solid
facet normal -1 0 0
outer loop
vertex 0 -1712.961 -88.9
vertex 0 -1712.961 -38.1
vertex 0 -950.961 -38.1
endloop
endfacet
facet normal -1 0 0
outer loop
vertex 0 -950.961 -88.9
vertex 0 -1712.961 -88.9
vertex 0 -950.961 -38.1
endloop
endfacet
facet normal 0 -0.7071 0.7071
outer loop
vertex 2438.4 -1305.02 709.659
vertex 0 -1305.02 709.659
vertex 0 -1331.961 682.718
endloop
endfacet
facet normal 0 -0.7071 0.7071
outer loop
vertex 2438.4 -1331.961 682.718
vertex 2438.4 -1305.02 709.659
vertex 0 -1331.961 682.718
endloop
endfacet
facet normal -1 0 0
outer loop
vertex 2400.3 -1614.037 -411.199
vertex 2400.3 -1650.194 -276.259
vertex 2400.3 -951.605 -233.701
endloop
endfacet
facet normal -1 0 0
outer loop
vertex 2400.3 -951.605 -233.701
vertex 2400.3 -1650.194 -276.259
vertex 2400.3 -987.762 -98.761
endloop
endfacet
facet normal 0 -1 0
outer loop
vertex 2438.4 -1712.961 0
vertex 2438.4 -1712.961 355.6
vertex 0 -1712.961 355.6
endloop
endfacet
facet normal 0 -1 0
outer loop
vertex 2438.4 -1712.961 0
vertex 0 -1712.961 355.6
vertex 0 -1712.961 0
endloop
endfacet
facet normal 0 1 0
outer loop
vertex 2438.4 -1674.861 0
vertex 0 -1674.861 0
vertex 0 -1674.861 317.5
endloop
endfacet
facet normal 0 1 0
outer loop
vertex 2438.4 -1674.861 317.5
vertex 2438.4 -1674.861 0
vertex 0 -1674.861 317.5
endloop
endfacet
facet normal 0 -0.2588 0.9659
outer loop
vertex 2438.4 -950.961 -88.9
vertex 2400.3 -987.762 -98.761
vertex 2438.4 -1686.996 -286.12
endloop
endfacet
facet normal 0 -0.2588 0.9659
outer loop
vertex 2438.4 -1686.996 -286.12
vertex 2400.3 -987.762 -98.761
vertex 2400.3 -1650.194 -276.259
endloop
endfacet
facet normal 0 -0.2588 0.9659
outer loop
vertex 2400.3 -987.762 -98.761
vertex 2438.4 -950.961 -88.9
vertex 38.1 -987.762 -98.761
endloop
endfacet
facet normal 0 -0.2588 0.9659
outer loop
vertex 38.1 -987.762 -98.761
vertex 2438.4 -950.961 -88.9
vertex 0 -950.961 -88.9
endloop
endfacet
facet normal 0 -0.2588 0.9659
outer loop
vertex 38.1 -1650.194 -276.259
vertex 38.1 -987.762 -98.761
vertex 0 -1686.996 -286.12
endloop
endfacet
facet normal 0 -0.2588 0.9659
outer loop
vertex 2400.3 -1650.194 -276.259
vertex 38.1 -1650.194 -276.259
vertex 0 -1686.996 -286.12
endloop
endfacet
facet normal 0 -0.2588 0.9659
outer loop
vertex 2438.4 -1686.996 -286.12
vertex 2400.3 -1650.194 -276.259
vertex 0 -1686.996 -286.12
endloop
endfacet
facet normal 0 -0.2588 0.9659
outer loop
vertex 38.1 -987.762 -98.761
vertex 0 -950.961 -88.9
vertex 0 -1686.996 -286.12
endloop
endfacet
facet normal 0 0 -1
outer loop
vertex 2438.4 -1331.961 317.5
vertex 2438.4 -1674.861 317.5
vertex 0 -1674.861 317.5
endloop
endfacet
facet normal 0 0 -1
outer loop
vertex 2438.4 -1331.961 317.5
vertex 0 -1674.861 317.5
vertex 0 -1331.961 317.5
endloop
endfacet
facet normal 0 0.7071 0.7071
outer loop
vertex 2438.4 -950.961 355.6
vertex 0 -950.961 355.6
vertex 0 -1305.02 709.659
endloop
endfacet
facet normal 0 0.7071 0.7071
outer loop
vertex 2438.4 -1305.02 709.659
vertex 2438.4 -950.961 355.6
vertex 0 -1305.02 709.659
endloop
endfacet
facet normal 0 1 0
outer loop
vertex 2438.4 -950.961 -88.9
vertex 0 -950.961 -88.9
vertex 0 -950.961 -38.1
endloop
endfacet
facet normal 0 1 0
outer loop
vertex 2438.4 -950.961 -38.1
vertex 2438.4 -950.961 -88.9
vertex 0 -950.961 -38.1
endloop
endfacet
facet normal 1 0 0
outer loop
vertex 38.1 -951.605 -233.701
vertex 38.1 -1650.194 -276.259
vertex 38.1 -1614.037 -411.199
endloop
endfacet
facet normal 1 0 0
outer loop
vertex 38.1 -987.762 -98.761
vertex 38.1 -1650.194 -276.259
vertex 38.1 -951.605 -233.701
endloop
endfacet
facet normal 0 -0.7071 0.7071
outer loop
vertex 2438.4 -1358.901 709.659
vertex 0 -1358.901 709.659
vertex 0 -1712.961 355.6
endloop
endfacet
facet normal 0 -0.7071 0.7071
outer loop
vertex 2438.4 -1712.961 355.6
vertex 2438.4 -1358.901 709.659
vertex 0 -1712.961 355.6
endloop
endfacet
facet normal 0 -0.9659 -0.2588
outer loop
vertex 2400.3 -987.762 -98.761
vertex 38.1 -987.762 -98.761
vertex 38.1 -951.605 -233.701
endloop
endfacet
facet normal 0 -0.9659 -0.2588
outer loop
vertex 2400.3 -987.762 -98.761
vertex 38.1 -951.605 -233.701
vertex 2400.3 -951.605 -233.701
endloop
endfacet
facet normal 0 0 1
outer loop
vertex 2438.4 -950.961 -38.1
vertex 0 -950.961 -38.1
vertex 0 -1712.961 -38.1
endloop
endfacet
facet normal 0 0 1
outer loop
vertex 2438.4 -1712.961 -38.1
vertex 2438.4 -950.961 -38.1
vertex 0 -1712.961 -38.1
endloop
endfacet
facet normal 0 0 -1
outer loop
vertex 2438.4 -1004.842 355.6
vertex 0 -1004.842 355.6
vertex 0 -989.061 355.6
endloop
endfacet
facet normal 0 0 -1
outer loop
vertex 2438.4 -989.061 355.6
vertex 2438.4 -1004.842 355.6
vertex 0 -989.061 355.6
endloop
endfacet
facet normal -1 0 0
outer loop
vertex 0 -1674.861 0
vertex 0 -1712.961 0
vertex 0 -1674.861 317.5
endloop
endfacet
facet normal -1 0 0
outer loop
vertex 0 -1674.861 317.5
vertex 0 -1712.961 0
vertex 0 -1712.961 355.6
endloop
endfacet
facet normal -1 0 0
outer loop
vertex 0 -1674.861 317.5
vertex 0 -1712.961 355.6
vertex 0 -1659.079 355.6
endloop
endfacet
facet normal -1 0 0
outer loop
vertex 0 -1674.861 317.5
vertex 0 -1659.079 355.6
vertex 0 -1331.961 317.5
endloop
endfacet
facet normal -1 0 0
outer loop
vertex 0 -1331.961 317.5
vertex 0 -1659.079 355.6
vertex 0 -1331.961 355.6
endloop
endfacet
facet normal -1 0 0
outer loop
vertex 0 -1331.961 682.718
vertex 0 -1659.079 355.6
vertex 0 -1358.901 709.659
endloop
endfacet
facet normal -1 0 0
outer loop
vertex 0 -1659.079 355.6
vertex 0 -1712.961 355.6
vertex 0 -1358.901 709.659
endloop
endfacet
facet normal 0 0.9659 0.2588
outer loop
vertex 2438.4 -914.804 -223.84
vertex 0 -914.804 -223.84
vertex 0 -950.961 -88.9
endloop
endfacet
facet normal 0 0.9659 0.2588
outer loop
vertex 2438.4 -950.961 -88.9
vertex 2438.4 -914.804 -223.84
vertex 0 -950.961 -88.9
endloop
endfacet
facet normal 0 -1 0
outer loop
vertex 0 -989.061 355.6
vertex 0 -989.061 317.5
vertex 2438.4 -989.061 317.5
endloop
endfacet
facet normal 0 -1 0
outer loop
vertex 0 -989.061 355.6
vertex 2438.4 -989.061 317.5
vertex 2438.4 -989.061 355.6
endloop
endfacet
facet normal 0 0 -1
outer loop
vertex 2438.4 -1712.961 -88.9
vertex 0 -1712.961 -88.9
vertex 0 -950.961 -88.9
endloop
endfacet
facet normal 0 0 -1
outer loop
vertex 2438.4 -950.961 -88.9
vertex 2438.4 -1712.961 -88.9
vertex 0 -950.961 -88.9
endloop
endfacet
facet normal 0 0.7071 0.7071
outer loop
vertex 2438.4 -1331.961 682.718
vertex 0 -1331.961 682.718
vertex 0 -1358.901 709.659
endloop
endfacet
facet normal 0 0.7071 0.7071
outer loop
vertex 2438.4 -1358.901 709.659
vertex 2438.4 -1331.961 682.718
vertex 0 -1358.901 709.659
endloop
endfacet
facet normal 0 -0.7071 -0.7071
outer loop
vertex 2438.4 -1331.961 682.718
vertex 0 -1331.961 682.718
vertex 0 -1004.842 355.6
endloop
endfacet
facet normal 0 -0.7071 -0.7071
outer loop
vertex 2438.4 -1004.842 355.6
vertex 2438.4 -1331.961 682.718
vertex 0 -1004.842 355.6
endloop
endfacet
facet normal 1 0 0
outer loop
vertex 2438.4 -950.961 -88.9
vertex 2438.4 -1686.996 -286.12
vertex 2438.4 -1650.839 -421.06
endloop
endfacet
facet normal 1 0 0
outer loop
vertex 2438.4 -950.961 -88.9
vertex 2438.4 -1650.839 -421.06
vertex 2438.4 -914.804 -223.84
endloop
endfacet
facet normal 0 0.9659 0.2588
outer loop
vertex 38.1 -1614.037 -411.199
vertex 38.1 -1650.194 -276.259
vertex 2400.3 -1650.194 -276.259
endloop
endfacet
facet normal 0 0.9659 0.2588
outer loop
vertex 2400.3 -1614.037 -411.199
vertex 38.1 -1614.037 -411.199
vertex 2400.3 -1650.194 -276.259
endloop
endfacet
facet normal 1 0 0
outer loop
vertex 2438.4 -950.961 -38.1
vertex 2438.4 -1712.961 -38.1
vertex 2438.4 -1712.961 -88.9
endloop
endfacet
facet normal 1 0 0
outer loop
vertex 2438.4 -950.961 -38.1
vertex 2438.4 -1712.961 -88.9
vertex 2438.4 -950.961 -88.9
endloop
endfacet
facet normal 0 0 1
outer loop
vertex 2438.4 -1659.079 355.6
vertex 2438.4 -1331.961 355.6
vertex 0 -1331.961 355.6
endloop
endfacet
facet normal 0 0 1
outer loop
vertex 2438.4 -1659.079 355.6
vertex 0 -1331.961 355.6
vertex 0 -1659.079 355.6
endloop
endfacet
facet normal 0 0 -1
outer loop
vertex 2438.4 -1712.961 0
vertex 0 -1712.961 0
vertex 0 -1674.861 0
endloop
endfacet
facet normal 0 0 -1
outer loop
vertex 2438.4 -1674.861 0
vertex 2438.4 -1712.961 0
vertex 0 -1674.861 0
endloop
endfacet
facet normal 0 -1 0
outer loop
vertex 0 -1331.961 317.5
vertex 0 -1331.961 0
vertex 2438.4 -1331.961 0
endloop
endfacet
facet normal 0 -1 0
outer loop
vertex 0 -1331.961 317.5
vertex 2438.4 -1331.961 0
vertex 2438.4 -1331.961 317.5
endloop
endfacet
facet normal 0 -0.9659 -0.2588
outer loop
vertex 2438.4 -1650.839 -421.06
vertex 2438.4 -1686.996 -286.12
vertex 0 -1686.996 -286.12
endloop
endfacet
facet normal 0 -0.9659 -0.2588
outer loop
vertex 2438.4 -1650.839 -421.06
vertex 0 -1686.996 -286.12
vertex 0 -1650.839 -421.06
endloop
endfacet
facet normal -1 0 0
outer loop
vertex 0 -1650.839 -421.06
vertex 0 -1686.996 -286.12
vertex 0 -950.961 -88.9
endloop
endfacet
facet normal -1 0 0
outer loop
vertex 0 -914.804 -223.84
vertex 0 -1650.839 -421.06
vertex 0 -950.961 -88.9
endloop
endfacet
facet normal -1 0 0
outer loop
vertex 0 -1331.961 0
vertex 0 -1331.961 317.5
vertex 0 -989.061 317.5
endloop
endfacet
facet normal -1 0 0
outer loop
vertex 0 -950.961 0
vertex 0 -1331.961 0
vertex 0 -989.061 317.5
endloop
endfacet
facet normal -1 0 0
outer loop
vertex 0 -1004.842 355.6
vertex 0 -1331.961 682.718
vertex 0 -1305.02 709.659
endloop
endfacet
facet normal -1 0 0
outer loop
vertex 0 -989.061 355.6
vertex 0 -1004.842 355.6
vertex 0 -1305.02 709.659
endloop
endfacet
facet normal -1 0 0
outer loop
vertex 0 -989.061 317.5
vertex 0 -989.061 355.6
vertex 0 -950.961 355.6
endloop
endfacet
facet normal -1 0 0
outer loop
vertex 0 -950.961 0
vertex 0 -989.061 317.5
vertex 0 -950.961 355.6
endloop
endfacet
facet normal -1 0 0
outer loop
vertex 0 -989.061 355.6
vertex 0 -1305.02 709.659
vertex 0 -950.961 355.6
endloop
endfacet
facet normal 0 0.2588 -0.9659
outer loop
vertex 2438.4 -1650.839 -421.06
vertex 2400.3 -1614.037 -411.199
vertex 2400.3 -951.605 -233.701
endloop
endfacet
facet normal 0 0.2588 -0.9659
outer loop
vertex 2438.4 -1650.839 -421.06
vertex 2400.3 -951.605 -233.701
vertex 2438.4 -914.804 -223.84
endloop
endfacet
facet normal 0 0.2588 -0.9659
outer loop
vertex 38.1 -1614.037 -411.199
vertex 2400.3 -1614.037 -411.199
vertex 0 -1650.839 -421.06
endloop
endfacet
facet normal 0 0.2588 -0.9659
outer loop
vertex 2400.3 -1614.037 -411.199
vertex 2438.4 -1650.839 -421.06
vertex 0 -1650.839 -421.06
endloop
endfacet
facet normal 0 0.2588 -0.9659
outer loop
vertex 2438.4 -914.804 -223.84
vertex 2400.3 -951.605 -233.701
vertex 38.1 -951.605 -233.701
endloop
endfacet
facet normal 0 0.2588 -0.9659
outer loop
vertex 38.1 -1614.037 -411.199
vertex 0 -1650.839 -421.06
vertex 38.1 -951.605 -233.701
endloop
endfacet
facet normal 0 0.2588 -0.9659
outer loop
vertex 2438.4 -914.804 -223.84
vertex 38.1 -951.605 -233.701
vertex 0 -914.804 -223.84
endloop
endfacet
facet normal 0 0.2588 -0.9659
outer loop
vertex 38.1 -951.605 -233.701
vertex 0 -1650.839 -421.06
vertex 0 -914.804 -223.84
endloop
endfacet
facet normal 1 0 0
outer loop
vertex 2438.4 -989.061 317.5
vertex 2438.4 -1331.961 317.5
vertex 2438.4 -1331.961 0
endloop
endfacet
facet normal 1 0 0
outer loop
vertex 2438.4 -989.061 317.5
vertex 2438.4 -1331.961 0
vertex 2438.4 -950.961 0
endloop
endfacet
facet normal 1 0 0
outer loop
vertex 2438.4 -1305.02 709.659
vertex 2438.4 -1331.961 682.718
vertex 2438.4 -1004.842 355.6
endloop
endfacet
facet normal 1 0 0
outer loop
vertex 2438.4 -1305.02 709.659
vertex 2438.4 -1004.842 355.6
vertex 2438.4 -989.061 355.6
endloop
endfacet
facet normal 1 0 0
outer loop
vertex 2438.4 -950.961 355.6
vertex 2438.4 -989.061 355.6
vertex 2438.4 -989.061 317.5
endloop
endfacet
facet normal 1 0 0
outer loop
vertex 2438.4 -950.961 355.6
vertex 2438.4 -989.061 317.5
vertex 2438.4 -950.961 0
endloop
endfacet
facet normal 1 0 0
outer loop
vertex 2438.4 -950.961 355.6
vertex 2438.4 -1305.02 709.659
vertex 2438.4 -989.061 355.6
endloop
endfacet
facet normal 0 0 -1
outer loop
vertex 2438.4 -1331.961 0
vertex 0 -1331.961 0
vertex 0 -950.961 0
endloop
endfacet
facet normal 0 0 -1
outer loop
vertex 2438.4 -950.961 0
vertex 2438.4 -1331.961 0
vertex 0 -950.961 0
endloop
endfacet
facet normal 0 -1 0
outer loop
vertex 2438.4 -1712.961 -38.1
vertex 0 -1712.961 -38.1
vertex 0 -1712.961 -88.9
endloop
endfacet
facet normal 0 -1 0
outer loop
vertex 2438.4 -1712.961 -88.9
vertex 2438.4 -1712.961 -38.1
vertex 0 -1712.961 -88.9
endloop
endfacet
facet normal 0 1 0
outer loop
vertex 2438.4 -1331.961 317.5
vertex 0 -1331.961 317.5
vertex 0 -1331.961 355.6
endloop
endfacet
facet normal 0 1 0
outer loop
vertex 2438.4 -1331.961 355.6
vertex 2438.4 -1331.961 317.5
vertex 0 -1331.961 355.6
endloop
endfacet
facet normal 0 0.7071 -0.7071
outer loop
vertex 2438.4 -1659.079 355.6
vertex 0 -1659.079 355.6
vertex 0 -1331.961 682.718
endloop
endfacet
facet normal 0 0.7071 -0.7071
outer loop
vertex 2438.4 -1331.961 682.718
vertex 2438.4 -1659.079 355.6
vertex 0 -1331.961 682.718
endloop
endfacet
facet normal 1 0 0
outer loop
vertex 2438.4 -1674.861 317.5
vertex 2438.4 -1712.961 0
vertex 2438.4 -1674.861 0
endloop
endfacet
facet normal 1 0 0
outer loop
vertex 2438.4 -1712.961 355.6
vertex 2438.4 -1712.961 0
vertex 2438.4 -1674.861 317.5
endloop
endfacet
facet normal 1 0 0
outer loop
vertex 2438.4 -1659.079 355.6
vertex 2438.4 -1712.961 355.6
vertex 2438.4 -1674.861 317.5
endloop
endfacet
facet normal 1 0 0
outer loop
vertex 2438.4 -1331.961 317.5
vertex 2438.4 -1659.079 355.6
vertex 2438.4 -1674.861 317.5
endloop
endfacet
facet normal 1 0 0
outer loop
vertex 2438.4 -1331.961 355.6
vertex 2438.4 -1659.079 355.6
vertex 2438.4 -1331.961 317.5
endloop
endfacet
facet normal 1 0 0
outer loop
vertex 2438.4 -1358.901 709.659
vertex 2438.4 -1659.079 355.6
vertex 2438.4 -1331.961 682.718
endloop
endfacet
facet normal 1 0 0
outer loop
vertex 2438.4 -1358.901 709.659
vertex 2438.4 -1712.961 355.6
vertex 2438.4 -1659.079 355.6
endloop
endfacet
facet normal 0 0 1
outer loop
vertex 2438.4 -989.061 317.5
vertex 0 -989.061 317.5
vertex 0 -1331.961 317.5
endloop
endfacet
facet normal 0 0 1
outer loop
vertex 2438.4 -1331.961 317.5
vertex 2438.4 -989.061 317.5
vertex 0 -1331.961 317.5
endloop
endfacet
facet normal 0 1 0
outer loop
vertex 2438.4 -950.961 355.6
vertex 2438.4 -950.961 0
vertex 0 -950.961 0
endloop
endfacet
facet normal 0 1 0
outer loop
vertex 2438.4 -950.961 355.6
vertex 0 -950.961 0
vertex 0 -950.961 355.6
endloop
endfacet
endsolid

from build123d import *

# Parameters (mm, degrees)
F1_DEPTH = 2438.4
F2_W     = 2362.2
F2_H     = 685.8
F3_DEPTH = 203.2
F4_DEPTH = 2438.4
F0_W     = 342.9
F0_H     = 317.5
F0_W_2   = 38.1
F0_H_2   = 38.1


# Not quite as in the source:
# - a feature names something its author has since deleted; it is built from what else it names


with BuildPart() as f1:
    # F0 (on Right) → F1 (new body)
    with BuildSketch(Plane.YZ):
        Polygon((-914.8036036659, -223.8398379326), (-950.9606242668, -88.9), (-1686.996103899, -286.1201123681), (-1650.8390832982, -421.0599503007), align=None)
    extrude(amount=F1_DEPTH)

    # F2 (on face) → F3 (cut)
    with BuildSketch(Plane(origin=(0, -41.4772828265, 154.7953268685), x_dir=(1, 0, 0), z_dir=(0, -0.2588190451, 0.9659258263))):
        with Locations((1219.2, -1322.5664398729)):
            Rectangle(F2_W, F2_H)
    extrude(amount=-F3_DEPTH, mode=Mode.SUBTRACT)


with BuildPart() as f4:
    # F0 (on Right) → F4 (new body)
    with BuildSketch(Plane.YZ):
        Polygon((-950.9606242668, -88.9), (-950.9606242668, -38.1), (-1331.9606242668, -38.1), (-1712.9606242668, -38.1), (-1712.9606242668, -88.9), align=None)
    extrude(amount=F4_DEPTH)


with BuildPart() as f4b:
    # F0 (on Right) → F4, piece 2 (new body)
    with BuildSketch(Plane.YZ):
        with Locations((-1160.5106242668, 158.75)):
            Rectangle(F0_W, F0_H)
        with Locations((-970.0106242668, 158.75)):
            Rectangle(F0_W_2, F0_H)
        with Locations((-970.0106242668, 336.55)):
            Rectangle(F0_W_2, F0_H_2)
        Polygon((-989.0606242668, 355.6), (-950.9606242668, 355.6), (-1305.0198559036, 709.6592316368), (-1331.9606242668, 682.7184632736), (-1004.8421609932, 355.6), align=None)
    extrude(amount=F4_DEPTH)


with BuildPart() as f4c:
    # F0 (on Right) → F4, piece 3 (new body)
    with BuildSketch(Plane.YZ):
        with Locations((-1693.9106242668, 158.75)):
            Rectangle(F0_W_2, F0_H)
        with Locations((-1693.9106242668, 336.55)):
            Rectangle(F0_W_2, F0_H_2)
        Polygon((-1331.9606242668, 317.5), (-1331.9606242668, 355.6), (-1659.0790875403, 355.6), (-1674.8606242668, 355.6), (-1674.8606242668, 317.5), align=None)
        Polygon((-1659.0790875403, 355.6), (-1331.9606242668, 682.7184632736), (-1358.90139263, 709.6592316368), (-1712.9606242668, 355.6), (-1674.8606242668, 355.6), align=None)
    extrude(amount=F4_DEPTH)


solid = Compound([f1.part, f4.part, f4b.part, f4c.part])
